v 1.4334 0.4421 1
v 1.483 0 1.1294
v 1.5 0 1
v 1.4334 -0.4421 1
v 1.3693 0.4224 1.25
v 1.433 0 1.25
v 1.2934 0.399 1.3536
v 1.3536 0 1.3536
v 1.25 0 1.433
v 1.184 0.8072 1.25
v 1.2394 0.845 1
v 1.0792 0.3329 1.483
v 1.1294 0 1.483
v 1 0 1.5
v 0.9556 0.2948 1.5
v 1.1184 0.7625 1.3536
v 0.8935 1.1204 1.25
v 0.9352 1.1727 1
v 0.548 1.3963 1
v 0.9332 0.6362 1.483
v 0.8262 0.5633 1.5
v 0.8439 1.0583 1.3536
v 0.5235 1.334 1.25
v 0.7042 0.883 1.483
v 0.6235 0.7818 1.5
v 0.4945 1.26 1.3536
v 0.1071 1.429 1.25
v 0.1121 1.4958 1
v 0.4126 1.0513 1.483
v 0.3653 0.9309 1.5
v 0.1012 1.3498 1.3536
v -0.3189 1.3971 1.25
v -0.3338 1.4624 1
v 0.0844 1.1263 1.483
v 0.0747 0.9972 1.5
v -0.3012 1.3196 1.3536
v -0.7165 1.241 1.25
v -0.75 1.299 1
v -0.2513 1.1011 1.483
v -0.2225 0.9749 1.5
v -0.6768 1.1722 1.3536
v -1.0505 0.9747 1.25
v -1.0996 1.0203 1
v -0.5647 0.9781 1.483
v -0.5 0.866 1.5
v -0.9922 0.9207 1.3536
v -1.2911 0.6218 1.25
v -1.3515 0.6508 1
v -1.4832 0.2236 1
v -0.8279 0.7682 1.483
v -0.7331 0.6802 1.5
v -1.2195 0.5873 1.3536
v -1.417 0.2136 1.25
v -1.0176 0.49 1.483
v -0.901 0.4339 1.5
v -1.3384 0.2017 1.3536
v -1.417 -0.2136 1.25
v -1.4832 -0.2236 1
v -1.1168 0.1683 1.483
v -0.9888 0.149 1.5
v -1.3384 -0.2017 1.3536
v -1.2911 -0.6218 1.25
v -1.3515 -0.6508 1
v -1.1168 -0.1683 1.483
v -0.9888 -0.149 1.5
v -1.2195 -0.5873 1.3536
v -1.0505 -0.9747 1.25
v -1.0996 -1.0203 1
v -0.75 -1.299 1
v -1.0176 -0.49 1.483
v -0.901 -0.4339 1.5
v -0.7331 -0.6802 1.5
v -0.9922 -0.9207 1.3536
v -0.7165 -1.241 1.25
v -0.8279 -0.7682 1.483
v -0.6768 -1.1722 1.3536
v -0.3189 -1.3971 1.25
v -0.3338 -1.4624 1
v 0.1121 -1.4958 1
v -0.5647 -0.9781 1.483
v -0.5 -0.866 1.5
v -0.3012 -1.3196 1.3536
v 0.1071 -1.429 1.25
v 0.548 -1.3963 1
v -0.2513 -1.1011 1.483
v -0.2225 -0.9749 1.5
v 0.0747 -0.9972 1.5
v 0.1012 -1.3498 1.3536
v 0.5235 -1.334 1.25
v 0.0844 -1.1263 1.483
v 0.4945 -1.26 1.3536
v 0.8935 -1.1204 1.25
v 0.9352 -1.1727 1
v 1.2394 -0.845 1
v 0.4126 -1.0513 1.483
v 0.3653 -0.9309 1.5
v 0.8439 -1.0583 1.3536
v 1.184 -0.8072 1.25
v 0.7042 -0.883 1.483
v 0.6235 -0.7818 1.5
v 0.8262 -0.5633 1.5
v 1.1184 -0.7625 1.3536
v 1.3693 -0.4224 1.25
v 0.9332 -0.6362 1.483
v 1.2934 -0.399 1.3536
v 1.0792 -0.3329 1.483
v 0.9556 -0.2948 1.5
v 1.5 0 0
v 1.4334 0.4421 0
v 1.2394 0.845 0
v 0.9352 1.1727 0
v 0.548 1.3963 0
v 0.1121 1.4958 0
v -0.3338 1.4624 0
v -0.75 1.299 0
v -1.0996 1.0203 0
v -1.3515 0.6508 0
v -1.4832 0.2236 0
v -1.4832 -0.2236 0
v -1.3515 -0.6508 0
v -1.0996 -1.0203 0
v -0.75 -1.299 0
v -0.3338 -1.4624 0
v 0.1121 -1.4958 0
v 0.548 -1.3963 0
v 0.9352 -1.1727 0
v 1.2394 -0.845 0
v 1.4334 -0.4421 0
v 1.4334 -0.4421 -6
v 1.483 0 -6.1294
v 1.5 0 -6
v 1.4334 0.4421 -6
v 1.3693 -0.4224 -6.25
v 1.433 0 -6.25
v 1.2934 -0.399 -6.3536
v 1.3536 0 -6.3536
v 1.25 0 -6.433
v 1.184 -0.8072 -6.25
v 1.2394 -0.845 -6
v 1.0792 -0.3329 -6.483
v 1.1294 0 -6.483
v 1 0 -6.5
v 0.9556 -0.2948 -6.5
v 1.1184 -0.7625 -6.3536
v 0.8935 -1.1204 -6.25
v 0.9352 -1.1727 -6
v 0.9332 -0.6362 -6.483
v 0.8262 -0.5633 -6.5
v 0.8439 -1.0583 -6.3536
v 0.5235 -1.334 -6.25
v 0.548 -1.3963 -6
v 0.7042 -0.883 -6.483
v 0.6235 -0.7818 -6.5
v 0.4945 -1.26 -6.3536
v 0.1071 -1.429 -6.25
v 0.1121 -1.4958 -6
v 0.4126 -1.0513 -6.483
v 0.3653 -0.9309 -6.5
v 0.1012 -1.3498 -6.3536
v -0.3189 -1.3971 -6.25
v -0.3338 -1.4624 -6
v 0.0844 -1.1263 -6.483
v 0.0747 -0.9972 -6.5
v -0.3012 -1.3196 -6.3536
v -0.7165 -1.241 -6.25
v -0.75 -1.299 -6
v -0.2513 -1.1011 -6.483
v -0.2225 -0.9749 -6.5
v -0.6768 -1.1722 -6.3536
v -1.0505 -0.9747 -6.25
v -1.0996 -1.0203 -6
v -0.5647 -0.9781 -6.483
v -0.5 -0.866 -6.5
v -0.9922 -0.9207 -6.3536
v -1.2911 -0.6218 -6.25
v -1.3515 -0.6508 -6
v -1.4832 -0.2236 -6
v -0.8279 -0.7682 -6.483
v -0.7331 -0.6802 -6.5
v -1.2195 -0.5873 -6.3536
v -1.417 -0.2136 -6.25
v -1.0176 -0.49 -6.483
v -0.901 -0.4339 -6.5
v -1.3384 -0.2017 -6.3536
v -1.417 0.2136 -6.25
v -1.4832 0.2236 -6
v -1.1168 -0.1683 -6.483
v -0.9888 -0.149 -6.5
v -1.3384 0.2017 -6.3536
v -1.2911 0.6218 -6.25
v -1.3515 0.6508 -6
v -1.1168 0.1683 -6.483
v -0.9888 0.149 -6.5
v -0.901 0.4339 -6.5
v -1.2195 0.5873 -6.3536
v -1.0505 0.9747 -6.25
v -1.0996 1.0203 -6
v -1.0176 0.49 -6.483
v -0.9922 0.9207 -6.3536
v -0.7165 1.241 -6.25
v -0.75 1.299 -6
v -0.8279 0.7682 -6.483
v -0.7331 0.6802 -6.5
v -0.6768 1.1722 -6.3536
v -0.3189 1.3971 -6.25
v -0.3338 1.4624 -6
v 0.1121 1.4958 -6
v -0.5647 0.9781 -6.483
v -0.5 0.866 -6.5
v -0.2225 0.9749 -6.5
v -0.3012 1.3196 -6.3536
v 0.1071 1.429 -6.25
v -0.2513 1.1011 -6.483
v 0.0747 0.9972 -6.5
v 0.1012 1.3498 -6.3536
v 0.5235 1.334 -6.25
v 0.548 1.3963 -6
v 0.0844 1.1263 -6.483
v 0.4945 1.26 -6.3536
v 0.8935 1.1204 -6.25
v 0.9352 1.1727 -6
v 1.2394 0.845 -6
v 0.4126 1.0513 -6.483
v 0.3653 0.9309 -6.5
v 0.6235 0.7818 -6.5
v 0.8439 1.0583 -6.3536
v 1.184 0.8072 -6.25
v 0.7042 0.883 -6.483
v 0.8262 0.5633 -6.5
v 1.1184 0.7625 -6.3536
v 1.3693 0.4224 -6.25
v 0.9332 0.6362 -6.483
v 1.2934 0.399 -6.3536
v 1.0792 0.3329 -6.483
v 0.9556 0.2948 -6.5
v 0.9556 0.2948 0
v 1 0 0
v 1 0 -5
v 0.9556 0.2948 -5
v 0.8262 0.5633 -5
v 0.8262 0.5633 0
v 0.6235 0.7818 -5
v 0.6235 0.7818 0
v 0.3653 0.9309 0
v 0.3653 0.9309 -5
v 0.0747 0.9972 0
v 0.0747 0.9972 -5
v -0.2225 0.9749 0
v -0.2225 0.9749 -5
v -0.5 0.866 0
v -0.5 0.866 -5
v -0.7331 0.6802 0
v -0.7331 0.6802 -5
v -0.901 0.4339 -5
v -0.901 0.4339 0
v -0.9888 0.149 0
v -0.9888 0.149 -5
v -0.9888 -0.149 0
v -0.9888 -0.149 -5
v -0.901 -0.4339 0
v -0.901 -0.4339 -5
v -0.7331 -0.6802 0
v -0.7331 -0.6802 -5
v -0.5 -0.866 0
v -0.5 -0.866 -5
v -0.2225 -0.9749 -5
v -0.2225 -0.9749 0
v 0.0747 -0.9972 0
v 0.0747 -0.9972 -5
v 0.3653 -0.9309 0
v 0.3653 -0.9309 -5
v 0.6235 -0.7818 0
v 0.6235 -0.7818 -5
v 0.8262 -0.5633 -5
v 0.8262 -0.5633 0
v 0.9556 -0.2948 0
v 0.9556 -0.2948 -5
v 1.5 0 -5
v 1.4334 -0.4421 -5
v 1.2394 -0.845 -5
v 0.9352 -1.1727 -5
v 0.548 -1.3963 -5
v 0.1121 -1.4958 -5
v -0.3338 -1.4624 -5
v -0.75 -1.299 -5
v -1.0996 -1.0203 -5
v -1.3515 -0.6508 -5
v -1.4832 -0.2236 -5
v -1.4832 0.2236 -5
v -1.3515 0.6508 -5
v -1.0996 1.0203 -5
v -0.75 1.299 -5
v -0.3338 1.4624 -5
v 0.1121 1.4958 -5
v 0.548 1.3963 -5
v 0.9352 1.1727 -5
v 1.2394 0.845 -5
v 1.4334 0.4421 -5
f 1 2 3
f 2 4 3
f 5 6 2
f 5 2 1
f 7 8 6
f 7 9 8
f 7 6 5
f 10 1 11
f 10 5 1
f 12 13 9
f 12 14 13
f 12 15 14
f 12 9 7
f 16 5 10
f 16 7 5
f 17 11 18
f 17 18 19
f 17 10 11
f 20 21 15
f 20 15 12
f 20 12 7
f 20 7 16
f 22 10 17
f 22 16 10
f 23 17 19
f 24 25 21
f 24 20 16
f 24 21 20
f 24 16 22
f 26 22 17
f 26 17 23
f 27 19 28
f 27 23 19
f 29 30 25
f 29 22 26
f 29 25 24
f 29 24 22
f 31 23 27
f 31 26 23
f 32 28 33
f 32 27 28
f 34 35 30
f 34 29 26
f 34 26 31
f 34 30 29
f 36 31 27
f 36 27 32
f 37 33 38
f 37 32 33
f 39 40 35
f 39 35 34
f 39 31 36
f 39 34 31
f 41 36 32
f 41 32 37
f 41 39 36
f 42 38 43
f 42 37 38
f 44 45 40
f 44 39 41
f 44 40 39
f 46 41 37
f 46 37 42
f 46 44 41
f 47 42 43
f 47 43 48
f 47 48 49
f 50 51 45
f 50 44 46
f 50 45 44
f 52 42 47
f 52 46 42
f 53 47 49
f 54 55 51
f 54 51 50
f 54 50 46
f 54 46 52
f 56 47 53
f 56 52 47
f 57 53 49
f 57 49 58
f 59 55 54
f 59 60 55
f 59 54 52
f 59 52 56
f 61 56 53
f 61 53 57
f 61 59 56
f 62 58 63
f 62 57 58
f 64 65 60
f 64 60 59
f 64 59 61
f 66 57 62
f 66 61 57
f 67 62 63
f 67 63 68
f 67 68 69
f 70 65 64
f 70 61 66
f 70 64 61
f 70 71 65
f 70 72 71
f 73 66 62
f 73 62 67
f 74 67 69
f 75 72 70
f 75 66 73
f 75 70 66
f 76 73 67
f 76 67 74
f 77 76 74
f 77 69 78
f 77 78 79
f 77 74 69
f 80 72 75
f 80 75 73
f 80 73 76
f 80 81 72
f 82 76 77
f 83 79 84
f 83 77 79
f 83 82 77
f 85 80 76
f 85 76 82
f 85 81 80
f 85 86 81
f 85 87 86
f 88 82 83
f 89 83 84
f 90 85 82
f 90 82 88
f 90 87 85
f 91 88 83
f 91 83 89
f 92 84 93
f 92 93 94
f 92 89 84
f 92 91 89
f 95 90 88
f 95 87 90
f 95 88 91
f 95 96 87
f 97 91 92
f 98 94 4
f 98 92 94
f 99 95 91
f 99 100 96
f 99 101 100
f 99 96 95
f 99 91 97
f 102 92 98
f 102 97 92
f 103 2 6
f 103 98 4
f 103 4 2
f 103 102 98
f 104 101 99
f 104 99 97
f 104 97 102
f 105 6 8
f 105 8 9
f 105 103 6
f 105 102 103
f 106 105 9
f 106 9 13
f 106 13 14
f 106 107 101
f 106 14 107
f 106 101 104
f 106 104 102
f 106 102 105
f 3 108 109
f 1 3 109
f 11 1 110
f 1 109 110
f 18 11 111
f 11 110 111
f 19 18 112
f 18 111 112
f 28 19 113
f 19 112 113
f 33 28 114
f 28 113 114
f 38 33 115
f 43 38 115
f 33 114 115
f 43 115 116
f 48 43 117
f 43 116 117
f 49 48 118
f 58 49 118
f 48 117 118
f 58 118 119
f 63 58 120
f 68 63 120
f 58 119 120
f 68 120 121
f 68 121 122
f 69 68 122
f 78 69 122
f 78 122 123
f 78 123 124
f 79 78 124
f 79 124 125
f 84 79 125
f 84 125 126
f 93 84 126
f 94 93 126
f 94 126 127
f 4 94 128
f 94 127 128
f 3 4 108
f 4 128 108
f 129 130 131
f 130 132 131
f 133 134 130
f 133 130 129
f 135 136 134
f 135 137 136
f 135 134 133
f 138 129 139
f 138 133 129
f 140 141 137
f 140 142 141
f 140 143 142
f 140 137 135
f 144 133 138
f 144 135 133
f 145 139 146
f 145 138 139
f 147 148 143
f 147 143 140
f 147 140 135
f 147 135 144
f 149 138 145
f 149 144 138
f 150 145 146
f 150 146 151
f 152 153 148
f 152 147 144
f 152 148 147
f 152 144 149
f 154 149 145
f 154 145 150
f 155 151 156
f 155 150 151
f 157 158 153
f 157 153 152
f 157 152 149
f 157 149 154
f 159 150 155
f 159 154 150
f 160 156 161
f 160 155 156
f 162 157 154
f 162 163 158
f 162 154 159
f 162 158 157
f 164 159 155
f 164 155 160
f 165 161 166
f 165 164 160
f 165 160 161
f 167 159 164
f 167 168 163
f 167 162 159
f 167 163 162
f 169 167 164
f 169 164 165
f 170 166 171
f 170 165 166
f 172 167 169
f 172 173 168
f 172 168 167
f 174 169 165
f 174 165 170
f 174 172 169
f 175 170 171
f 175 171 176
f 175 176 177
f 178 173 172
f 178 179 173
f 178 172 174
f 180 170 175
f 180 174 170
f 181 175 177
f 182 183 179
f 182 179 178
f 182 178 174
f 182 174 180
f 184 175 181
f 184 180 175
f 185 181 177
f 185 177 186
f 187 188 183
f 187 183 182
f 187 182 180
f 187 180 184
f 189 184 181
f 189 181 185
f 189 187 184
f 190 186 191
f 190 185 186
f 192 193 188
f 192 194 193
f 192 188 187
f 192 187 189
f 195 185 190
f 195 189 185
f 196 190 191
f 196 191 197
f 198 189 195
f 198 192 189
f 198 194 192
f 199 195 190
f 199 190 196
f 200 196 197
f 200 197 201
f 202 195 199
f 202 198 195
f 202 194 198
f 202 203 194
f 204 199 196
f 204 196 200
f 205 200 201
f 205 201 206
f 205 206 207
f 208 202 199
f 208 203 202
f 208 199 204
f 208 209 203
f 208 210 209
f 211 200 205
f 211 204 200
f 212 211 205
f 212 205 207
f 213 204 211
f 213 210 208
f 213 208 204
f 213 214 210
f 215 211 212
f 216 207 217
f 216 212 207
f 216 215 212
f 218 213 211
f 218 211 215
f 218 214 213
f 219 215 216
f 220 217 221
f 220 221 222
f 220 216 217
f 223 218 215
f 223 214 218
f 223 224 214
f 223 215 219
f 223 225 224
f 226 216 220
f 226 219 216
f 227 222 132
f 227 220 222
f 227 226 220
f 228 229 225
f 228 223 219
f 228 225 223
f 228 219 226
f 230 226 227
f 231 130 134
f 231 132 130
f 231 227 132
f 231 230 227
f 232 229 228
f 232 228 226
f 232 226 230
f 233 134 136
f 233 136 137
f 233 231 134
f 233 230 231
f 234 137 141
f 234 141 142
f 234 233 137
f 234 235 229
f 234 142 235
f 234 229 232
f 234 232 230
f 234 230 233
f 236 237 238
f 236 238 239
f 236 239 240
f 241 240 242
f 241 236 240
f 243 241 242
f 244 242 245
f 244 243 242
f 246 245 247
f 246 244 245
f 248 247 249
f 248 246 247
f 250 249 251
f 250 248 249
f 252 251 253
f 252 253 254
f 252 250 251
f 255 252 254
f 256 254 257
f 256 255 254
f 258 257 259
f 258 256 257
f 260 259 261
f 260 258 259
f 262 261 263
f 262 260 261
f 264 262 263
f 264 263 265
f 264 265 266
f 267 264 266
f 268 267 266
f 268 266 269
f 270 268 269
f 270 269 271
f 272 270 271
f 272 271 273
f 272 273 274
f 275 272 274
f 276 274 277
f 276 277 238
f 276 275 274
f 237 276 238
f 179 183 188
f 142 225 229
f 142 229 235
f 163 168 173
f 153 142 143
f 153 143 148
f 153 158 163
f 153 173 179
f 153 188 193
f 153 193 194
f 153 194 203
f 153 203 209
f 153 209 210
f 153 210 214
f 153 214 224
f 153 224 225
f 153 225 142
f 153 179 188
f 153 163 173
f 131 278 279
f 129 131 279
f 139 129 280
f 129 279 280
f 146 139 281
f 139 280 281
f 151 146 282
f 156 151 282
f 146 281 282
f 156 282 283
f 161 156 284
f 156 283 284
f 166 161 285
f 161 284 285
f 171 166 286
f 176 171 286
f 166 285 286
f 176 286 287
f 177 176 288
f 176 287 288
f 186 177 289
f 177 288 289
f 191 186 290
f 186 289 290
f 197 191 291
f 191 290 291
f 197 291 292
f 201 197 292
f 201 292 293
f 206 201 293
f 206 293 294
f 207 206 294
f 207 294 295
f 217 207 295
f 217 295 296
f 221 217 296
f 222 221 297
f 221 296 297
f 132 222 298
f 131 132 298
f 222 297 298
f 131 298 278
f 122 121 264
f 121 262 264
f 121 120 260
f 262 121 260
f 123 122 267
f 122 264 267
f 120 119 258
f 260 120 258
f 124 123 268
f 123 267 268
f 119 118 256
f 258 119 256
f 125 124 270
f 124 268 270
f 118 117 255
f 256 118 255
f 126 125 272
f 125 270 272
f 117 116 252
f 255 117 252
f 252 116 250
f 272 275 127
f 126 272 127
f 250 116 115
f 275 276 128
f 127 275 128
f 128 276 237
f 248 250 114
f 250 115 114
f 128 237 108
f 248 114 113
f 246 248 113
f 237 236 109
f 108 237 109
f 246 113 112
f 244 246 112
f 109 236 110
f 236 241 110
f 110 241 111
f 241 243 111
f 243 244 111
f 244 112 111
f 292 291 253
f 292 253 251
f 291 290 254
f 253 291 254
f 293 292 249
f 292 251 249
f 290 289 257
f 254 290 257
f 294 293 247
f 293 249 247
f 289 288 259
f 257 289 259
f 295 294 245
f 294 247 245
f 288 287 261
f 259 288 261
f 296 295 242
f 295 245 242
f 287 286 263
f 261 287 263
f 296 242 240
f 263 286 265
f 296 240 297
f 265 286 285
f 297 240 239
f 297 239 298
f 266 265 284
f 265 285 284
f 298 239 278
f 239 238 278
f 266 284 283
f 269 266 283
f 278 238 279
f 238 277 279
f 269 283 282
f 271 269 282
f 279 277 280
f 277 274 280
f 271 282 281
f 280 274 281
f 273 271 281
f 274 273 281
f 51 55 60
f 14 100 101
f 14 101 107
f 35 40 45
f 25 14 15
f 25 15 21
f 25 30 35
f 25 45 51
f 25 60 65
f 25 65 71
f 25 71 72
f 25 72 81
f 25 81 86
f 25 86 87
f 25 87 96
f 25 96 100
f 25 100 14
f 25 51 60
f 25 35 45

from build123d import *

# Parameters (mm, degrees)
F0_R     = 1
F1_DEPTH = 5
F2_R     = 1.5
F3_DEPTH = 1.5
F4_R     = 0.5
F5_R     = 1.5
F5_R_2   = 1
F6_DEPTH = 1.5
F7_R     = 0.5


with BuildPart() as f1:
    # F0 (on Top) → F1 (new body)
    with BuildSketch(Plane.XY):
        Circle(F0_R)
    extrude(amount=-F1_DEPTH)

    # F2 (on face) → F3 (join)
    with BuildSketch(Plane.XY):
        Circle(F2_R)
    extrude(amount=F3_DEPTH)

    # F4
    f4_edges = [f1.edges().sort_by_distance(p)[0] for p in [
        (-1.5, 0, 1.5),
    ]]
    fillet(f4_edges, radius=F4_R)

    # F5 (on face) → F6 (join)
    with BuildSketch(Plane(origin=(0, 0, -5), x_dir=(1, 0, 0), z_dir=(0, 0, -1))):
        Circle(F5_R)
        Circle(F5_R_2, mode=Mode.SUBTRACT)
        Circle(F5_R_2)
    extrude(amount=F6_DEPTH)

    # F7
    f7_edges = [f1.edges().sort_by_distance(p)[0] for p in [
        (-1.5, 0, -6.5),
    ]]
    fillet(f7_edges, radius=F7_R)


solid = f1.part
